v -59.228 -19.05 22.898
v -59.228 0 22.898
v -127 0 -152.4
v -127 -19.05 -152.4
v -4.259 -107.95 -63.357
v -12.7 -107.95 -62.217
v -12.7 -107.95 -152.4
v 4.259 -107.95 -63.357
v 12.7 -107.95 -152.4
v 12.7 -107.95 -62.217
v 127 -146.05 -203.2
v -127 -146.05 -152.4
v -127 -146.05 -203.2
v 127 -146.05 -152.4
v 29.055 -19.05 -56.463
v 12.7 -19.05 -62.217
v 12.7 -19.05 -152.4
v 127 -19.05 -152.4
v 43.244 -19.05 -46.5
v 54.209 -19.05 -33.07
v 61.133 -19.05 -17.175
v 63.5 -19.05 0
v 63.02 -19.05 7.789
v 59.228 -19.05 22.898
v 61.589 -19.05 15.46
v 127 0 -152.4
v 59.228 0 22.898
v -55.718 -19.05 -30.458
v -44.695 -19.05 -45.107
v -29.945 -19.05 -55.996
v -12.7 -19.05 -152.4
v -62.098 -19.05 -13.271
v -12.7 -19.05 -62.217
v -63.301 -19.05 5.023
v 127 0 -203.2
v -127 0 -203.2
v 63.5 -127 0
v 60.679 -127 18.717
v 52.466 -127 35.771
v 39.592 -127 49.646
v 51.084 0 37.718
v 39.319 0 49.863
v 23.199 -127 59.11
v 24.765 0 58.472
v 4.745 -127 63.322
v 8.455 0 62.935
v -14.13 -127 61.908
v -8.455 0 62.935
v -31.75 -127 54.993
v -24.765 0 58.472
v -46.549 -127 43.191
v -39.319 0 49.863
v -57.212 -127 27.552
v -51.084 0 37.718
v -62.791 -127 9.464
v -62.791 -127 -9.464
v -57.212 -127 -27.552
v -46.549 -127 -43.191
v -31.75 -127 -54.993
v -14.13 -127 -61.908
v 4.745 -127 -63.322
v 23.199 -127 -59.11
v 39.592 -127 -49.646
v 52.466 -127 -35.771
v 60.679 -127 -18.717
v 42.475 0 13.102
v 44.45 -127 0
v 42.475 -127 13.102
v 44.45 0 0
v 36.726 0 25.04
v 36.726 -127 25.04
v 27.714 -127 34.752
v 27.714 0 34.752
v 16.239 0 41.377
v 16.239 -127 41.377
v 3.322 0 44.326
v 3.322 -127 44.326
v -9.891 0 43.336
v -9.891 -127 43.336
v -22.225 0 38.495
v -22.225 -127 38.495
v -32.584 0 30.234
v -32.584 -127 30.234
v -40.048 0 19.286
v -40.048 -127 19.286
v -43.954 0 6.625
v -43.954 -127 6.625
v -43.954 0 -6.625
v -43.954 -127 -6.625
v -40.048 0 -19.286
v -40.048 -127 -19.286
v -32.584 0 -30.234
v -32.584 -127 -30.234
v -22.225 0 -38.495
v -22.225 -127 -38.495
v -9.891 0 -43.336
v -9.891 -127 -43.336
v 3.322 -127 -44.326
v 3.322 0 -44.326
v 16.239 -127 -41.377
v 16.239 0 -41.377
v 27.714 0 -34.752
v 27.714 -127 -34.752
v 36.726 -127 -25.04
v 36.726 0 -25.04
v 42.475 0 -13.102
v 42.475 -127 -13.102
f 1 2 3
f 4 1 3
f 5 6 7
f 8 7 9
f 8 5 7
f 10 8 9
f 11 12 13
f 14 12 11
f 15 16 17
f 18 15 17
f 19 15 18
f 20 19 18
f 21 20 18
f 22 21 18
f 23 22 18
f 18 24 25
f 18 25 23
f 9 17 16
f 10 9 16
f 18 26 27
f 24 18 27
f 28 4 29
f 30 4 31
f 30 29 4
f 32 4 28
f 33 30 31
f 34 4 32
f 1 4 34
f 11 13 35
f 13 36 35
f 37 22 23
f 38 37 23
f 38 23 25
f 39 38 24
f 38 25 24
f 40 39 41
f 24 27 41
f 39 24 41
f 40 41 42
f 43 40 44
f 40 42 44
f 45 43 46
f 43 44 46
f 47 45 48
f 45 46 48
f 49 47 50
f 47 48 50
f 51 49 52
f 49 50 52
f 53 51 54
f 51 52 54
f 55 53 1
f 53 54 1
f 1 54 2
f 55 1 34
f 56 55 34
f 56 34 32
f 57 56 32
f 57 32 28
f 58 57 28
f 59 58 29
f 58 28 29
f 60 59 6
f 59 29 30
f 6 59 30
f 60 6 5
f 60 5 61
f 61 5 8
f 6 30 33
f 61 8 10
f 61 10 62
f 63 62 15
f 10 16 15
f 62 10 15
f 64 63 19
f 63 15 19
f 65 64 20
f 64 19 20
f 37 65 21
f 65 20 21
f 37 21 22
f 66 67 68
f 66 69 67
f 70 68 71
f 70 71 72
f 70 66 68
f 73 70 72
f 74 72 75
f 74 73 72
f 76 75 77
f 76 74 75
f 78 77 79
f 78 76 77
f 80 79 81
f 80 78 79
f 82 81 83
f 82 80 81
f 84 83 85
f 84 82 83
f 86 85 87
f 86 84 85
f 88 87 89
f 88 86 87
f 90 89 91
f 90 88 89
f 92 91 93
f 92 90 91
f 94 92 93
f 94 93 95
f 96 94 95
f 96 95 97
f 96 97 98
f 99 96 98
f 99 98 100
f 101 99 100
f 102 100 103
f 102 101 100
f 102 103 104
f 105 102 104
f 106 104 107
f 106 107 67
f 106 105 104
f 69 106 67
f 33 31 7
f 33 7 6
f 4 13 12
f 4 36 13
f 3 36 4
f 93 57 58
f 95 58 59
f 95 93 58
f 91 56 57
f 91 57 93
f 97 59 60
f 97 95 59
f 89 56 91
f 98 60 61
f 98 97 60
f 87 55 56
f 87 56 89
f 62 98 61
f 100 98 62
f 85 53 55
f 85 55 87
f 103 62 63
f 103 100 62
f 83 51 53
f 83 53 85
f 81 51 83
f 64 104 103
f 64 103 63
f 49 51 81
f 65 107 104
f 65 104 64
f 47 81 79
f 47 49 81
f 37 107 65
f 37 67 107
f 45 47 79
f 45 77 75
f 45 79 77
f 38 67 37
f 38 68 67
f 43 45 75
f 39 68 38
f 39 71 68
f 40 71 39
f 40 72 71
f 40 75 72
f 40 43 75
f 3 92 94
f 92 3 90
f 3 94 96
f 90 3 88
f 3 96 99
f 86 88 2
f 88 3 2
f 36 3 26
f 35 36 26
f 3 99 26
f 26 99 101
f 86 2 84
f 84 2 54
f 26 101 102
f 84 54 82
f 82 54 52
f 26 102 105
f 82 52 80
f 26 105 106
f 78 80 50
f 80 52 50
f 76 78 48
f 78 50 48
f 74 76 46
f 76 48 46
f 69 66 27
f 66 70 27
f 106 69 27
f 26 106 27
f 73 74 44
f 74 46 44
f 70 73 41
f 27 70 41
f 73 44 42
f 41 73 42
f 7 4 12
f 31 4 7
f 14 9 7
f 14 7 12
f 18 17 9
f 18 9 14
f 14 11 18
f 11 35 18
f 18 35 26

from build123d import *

# Parameters (mm, degrees)
F0_R     = 44.45
F1_DEPTH = 19.05
F2_R     = 63.5
F2_R_2   = 44.45
F3_DEPTH = 107.95
F4_W     = 254
F4_H     = 50.8
F5_DEPTH = 127
F6_W     = 25.4
F6_H     = 99.06
F7_DEPTH = 88.9


with BuildPart() as f1:
    # F0 (on Front) → F1 (new body)
    with BuildSketch(Plane.XZ):
        with BuildLine():
            Line((127, -152.4), (59.227747, 22.898122))
            ThreePointArc((59.227747, 22.898122), (0, 63.5), (-59.227747, 22.898122))
            Line((-59.227747, 22.898122), (-127, -152.4))
            Line((-127, -152.4), (-127, -203.2))
            Line((-127, -203.2), (127, -203.2))
            Line((127, -203.2), (127, -152.4))
        make_face()
        Circle(F0_R, mode=Mode.SUBTRACT)
    extrude(amount=F1_DEPTH)

    # F2 (on face) → F3 (join)
    with BuildSketch(Plane.XZ.offset(19.05)):
        Circle(F2_R)
        Circle(F2_R_2, mode=Mode.SUBTRACT)
    extrude(amount=F3_DEPTH)

    # F4 (on face) → F5 (join)
    with BuildSketch(Plane.XZ.offset(19.05)):
        with Locations((0, -177.8)):
            Rectangle(F4_W, F4_H)
    extrude(amount=F5_DEPTH)

    # F6 (on face) → F7 (join)
    with BuildSketch(Plane.XZ.offset(19.05)):
        with Locations((0, -102.87)):
            Rectangle(F6_W, F6_H)
    extrude(amount=F7_DEPTH)


solid = f1.part
